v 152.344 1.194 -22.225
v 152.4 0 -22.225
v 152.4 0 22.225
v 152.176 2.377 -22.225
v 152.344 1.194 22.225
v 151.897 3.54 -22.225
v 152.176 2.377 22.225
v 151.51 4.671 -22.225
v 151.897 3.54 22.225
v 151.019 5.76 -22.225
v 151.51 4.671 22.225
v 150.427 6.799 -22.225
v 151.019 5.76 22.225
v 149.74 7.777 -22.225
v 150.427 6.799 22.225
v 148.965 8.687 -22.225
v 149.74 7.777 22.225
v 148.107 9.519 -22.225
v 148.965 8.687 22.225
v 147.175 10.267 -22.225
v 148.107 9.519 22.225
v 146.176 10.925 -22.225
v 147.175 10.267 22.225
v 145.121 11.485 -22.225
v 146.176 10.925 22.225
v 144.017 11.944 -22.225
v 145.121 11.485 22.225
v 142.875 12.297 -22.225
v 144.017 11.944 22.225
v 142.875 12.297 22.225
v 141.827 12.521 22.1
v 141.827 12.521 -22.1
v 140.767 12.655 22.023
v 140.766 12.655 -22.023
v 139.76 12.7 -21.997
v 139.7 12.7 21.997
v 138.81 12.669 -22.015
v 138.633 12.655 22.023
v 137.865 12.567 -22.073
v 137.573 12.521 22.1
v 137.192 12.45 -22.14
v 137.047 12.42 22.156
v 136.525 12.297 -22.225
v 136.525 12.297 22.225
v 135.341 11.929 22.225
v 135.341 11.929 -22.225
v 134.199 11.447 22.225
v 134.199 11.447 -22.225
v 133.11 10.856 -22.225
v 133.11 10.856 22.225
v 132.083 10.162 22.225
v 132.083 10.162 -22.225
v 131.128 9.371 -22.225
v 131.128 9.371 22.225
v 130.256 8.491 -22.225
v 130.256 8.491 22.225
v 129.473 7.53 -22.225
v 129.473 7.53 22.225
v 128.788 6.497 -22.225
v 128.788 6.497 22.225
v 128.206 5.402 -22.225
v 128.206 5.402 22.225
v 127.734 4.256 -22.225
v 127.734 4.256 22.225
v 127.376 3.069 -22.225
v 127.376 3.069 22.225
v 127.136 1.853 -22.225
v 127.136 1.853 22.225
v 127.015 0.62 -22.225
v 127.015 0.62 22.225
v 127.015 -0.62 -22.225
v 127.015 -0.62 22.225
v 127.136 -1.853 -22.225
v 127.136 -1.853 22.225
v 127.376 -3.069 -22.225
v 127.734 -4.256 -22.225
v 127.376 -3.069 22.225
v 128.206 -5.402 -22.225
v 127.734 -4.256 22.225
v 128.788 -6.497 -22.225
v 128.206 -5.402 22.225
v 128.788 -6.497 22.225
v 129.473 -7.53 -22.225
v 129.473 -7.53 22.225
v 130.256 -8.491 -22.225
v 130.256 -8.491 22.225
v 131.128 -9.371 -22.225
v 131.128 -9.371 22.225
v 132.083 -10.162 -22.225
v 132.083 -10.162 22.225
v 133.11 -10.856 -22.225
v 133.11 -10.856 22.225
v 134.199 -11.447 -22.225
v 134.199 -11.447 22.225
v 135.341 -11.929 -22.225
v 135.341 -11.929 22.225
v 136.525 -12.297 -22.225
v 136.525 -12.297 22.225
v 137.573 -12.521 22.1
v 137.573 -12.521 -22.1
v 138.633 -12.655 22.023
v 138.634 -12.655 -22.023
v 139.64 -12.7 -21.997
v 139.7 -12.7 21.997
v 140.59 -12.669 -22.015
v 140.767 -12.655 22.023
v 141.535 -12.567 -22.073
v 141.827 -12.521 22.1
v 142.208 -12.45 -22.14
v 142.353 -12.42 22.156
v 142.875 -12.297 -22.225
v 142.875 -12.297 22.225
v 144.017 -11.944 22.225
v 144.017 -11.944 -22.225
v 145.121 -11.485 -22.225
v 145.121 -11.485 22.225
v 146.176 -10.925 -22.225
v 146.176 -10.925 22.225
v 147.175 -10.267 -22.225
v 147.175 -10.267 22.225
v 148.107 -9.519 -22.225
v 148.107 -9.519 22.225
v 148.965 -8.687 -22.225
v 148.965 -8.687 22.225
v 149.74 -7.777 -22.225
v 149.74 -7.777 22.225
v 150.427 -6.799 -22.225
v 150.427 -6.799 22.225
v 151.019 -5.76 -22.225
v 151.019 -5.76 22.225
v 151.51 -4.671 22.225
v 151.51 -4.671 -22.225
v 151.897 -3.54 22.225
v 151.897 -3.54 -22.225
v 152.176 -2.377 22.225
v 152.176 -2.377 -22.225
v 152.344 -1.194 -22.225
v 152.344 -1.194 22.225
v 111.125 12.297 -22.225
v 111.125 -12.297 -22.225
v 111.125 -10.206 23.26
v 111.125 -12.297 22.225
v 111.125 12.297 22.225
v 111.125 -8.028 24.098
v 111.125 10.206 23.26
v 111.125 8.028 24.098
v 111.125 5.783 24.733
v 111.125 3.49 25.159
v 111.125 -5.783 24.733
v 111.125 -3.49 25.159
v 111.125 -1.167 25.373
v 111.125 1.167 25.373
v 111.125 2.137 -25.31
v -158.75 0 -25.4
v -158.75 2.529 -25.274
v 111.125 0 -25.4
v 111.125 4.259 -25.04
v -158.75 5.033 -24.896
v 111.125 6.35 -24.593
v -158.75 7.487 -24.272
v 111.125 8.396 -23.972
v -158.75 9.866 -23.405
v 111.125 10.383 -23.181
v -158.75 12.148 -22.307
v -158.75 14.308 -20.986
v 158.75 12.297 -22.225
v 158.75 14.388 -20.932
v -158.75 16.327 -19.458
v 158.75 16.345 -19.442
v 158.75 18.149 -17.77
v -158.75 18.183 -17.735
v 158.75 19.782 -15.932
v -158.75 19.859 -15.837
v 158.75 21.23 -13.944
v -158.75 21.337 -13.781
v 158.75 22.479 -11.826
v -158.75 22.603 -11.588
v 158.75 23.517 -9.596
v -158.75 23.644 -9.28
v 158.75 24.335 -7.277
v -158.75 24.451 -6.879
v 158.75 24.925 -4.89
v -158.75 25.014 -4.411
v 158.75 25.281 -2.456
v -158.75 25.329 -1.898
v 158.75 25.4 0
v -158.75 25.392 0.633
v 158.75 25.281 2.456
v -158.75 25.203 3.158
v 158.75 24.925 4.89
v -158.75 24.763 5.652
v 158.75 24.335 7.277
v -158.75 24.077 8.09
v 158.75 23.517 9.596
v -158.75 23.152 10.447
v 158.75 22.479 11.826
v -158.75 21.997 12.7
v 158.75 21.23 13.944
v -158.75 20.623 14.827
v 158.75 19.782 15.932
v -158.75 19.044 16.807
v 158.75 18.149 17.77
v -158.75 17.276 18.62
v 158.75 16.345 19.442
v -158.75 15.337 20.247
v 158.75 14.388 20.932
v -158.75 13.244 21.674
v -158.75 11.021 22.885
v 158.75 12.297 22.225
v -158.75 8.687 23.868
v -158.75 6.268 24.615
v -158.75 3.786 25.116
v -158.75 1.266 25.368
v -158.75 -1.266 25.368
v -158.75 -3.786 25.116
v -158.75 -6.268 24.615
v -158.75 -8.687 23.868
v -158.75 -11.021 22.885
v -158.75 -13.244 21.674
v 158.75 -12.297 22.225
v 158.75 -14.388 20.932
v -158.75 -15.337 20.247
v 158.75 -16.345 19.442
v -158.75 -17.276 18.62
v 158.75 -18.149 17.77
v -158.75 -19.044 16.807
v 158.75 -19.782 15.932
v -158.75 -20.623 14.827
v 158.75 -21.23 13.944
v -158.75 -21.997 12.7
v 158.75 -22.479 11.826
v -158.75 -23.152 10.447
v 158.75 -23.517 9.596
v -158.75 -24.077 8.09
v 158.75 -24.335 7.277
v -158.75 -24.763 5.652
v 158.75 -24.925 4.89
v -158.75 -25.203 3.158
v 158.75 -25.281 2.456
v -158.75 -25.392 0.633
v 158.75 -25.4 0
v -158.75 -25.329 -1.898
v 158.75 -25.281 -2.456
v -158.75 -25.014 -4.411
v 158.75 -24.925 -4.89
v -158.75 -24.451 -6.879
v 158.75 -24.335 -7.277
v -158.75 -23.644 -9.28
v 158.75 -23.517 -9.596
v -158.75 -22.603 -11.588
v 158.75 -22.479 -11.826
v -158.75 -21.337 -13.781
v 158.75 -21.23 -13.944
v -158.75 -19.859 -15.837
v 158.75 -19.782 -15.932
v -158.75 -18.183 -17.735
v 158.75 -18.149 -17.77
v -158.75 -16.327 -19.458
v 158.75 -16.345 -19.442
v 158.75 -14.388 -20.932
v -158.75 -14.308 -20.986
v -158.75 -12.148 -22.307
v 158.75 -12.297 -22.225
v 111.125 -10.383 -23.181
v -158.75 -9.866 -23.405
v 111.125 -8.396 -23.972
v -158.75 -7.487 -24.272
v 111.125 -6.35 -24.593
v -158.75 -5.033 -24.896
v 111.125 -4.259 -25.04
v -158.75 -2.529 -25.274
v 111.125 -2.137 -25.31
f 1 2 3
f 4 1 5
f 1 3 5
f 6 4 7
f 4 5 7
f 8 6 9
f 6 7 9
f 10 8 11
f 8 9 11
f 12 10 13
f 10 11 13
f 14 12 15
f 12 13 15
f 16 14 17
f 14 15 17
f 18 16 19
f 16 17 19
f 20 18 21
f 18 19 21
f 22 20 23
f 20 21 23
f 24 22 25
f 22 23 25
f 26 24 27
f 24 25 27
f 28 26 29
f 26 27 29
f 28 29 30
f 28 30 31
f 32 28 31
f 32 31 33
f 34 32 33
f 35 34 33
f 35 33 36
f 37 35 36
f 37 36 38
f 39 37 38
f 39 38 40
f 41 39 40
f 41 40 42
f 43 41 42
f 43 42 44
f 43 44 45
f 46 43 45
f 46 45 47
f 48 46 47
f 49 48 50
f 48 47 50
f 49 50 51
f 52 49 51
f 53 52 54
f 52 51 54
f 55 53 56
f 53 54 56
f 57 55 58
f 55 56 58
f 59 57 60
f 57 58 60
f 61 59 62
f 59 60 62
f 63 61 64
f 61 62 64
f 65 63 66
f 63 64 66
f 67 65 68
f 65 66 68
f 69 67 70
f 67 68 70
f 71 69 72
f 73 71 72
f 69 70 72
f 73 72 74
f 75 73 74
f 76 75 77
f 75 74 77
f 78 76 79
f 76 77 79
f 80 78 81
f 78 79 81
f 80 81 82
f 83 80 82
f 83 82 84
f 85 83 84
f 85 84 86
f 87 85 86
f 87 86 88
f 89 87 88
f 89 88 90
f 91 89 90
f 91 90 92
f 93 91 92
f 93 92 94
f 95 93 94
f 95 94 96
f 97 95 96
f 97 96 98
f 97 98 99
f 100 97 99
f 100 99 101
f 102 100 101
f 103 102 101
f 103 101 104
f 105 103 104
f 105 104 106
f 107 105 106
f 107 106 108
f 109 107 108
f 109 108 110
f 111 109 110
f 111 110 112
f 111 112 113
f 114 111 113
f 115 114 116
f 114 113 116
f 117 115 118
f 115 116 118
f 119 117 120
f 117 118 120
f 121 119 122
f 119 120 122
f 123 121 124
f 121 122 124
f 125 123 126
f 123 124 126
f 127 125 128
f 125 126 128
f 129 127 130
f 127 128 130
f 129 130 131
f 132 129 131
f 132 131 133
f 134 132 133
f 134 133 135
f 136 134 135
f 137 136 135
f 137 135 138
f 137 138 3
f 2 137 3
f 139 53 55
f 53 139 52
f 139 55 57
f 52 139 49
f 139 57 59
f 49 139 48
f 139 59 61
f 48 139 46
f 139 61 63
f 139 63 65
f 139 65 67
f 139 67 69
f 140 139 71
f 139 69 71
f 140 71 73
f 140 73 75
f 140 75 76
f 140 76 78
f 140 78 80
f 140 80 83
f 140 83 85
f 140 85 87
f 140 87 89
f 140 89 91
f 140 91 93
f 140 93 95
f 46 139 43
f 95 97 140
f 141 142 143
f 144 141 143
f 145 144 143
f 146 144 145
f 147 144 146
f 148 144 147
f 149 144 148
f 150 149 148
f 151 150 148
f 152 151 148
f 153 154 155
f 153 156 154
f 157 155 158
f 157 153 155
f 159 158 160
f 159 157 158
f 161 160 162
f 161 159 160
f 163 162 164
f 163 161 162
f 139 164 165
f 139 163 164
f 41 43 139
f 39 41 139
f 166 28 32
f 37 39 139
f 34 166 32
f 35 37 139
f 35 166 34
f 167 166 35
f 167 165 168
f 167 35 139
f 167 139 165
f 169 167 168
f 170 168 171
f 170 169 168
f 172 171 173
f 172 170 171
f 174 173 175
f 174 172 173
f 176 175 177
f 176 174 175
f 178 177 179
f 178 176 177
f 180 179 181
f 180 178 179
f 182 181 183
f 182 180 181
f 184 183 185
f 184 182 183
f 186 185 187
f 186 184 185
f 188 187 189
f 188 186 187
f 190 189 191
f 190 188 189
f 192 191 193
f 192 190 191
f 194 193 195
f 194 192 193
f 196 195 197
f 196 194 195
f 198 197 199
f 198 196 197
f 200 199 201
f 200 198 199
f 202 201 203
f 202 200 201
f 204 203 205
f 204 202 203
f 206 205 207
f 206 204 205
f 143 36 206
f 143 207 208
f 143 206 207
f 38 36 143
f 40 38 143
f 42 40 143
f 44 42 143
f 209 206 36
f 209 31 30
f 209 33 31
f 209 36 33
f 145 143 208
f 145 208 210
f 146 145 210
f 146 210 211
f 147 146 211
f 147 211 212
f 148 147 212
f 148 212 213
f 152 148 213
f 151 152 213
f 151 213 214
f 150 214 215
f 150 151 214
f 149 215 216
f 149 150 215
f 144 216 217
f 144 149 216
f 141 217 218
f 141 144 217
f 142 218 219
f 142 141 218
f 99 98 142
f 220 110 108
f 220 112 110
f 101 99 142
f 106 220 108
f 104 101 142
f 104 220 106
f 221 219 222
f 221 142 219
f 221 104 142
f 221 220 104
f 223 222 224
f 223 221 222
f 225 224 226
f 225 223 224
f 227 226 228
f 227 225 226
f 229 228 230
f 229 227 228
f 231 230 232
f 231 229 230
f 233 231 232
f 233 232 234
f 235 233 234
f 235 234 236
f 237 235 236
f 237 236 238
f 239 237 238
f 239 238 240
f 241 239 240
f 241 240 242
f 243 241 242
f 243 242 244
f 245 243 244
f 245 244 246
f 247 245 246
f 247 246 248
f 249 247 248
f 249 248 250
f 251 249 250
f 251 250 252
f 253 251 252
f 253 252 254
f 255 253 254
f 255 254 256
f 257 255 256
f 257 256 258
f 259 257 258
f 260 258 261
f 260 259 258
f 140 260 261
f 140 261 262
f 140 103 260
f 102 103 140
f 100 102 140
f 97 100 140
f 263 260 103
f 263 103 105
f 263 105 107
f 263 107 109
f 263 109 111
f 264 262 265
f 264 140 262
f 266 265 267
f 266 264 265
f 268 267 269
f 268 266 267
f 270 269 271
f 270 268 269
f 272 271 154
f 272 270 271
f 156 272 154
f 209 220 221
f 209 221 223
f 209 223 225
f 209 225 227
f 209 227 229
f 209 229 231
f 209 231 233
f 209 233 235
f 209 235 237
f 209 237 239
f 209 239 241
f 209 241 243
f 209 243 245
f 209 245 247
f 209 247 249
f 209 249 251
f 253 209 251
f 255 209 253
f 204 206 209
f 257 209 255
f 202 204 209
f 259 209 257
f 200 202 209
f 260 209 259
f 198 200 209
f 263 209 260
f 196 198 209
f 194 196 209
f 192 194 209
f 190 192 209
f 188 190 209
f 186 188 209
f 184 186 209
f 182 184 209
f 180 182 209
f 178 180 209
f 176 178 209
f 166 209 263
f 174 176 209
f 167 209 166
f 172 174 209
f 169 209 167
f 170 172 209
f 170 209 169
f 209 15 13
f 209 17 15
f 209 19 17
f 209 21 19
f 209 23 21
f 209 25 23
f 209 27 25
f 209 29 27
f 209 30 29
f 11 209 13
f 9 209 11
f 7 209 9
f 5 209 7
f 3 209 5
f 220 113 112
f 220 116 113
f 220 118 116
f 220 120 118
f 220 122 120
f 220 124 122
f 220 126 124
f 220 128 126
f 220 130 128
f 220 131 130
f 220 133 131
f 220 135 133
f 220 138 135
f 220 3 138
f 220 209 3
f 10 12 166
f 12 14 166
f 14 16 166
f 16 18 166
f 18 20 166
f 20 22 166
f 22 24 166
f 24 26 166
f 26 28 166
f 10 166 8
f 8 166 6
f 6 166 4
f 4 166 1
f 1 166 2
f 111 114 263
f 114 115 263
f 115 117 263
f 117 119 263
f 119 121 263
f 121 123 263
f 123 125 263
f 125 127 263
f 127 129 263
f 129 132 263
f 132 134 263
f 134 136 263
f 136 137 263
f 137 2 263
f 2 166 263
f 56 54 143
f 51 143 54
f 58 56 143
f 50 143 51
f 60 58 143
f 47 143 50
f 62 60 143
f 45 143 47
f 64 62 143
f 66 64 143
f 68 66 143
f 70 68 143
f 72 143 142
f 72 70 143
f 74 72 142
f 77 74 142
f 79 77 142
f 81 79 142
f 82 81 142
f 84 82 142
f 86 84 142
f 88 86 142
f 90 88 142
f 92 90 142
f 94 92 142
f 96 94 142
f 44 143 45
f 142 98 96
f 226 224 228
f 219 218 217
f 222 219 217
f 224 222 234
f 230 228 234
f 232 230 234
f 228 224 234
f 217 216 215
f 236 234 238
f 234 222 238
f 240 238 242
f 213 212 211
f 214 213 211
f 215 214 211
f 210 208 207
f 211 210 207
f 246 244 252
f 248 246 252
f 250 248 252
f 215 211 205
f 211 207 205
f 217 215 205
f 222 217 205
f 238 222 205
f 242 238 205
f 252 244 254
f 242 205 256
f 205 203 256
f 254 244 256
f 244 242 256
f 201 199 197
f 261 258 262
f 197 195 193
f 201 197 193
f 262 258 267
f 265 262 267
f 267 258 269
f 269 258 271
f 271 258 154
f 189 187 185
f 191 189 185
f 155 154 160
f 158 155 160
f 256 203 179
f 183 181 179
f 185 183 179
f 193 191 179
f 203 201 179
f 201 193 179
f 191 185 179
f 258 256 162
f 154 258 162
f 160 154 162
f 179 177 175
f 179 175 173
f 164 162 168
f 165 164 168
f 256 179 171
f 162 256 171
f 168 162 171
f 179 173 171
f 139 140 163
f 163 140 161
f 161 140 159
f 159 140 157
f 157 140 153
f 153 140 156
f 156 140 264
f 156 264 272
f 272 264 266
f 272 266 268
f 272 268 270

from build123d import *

# Parameters (mm, degrees)
SKETCH2_R           = 25.4
BOSS_EXTRUDE1_DEPTH = 158.75
CUT_EXTRUDE1_DEPTH  = 47.625
SKETCH4_R           = 12.7
CUT_EXTRUDE2_DEPTH  = 48.625


with BuildPart() as part:
    # Sketch2 → Boss-Extrude1 (new body, symmetric)
    with BuildSketch(Plane(origin=(0, 0, 0), x_dir=(0, 0, -1), z_dir=(1, 0, 0))):
        Circle(SKETCH2_R)
    extrude(amount=BOSS_EXTRUDE1_DEPTH, both=True)

    # Sketch3 → Cut-Extrude1 (cut)
    with BuildSketch(Plane(origin=(158.75, 0, 0), x_dir=(0, 0, -1), z_dir=(1, 0, 0))):
        with BuildLine():
            Line((-22.225, 12.296722124), (-22.225, -12.296722124))
            ThreePointArc((-22.225, -12.296722124), (-25.4, 0), (-22.225, 12.296722124))
        make_face()
        with BuildLine():
            Line((22.225, 12.296722124), (22.225, -12.296722124))
            ThreePointArc((22.225, -12.296722124), (25.4, 0), (22.225, 12.296722124))
        make_face()
    extrude(amount=-CUT_EXTRUDE1_DEPTH, mode=Mode.SUBTRACT)

    # Sketch4 → Cut-Extrude2 (cut, through all)
    with BuildSketch(Plane.XY.offset(22.225)):
        with Locations((139.7, 0)):
            Circle(SKETCH4_R)
    extrude(amount=-CUT_EXTRUDE2_DEPTH, mode=Mode.SUBTRACT)


solid = part.part
